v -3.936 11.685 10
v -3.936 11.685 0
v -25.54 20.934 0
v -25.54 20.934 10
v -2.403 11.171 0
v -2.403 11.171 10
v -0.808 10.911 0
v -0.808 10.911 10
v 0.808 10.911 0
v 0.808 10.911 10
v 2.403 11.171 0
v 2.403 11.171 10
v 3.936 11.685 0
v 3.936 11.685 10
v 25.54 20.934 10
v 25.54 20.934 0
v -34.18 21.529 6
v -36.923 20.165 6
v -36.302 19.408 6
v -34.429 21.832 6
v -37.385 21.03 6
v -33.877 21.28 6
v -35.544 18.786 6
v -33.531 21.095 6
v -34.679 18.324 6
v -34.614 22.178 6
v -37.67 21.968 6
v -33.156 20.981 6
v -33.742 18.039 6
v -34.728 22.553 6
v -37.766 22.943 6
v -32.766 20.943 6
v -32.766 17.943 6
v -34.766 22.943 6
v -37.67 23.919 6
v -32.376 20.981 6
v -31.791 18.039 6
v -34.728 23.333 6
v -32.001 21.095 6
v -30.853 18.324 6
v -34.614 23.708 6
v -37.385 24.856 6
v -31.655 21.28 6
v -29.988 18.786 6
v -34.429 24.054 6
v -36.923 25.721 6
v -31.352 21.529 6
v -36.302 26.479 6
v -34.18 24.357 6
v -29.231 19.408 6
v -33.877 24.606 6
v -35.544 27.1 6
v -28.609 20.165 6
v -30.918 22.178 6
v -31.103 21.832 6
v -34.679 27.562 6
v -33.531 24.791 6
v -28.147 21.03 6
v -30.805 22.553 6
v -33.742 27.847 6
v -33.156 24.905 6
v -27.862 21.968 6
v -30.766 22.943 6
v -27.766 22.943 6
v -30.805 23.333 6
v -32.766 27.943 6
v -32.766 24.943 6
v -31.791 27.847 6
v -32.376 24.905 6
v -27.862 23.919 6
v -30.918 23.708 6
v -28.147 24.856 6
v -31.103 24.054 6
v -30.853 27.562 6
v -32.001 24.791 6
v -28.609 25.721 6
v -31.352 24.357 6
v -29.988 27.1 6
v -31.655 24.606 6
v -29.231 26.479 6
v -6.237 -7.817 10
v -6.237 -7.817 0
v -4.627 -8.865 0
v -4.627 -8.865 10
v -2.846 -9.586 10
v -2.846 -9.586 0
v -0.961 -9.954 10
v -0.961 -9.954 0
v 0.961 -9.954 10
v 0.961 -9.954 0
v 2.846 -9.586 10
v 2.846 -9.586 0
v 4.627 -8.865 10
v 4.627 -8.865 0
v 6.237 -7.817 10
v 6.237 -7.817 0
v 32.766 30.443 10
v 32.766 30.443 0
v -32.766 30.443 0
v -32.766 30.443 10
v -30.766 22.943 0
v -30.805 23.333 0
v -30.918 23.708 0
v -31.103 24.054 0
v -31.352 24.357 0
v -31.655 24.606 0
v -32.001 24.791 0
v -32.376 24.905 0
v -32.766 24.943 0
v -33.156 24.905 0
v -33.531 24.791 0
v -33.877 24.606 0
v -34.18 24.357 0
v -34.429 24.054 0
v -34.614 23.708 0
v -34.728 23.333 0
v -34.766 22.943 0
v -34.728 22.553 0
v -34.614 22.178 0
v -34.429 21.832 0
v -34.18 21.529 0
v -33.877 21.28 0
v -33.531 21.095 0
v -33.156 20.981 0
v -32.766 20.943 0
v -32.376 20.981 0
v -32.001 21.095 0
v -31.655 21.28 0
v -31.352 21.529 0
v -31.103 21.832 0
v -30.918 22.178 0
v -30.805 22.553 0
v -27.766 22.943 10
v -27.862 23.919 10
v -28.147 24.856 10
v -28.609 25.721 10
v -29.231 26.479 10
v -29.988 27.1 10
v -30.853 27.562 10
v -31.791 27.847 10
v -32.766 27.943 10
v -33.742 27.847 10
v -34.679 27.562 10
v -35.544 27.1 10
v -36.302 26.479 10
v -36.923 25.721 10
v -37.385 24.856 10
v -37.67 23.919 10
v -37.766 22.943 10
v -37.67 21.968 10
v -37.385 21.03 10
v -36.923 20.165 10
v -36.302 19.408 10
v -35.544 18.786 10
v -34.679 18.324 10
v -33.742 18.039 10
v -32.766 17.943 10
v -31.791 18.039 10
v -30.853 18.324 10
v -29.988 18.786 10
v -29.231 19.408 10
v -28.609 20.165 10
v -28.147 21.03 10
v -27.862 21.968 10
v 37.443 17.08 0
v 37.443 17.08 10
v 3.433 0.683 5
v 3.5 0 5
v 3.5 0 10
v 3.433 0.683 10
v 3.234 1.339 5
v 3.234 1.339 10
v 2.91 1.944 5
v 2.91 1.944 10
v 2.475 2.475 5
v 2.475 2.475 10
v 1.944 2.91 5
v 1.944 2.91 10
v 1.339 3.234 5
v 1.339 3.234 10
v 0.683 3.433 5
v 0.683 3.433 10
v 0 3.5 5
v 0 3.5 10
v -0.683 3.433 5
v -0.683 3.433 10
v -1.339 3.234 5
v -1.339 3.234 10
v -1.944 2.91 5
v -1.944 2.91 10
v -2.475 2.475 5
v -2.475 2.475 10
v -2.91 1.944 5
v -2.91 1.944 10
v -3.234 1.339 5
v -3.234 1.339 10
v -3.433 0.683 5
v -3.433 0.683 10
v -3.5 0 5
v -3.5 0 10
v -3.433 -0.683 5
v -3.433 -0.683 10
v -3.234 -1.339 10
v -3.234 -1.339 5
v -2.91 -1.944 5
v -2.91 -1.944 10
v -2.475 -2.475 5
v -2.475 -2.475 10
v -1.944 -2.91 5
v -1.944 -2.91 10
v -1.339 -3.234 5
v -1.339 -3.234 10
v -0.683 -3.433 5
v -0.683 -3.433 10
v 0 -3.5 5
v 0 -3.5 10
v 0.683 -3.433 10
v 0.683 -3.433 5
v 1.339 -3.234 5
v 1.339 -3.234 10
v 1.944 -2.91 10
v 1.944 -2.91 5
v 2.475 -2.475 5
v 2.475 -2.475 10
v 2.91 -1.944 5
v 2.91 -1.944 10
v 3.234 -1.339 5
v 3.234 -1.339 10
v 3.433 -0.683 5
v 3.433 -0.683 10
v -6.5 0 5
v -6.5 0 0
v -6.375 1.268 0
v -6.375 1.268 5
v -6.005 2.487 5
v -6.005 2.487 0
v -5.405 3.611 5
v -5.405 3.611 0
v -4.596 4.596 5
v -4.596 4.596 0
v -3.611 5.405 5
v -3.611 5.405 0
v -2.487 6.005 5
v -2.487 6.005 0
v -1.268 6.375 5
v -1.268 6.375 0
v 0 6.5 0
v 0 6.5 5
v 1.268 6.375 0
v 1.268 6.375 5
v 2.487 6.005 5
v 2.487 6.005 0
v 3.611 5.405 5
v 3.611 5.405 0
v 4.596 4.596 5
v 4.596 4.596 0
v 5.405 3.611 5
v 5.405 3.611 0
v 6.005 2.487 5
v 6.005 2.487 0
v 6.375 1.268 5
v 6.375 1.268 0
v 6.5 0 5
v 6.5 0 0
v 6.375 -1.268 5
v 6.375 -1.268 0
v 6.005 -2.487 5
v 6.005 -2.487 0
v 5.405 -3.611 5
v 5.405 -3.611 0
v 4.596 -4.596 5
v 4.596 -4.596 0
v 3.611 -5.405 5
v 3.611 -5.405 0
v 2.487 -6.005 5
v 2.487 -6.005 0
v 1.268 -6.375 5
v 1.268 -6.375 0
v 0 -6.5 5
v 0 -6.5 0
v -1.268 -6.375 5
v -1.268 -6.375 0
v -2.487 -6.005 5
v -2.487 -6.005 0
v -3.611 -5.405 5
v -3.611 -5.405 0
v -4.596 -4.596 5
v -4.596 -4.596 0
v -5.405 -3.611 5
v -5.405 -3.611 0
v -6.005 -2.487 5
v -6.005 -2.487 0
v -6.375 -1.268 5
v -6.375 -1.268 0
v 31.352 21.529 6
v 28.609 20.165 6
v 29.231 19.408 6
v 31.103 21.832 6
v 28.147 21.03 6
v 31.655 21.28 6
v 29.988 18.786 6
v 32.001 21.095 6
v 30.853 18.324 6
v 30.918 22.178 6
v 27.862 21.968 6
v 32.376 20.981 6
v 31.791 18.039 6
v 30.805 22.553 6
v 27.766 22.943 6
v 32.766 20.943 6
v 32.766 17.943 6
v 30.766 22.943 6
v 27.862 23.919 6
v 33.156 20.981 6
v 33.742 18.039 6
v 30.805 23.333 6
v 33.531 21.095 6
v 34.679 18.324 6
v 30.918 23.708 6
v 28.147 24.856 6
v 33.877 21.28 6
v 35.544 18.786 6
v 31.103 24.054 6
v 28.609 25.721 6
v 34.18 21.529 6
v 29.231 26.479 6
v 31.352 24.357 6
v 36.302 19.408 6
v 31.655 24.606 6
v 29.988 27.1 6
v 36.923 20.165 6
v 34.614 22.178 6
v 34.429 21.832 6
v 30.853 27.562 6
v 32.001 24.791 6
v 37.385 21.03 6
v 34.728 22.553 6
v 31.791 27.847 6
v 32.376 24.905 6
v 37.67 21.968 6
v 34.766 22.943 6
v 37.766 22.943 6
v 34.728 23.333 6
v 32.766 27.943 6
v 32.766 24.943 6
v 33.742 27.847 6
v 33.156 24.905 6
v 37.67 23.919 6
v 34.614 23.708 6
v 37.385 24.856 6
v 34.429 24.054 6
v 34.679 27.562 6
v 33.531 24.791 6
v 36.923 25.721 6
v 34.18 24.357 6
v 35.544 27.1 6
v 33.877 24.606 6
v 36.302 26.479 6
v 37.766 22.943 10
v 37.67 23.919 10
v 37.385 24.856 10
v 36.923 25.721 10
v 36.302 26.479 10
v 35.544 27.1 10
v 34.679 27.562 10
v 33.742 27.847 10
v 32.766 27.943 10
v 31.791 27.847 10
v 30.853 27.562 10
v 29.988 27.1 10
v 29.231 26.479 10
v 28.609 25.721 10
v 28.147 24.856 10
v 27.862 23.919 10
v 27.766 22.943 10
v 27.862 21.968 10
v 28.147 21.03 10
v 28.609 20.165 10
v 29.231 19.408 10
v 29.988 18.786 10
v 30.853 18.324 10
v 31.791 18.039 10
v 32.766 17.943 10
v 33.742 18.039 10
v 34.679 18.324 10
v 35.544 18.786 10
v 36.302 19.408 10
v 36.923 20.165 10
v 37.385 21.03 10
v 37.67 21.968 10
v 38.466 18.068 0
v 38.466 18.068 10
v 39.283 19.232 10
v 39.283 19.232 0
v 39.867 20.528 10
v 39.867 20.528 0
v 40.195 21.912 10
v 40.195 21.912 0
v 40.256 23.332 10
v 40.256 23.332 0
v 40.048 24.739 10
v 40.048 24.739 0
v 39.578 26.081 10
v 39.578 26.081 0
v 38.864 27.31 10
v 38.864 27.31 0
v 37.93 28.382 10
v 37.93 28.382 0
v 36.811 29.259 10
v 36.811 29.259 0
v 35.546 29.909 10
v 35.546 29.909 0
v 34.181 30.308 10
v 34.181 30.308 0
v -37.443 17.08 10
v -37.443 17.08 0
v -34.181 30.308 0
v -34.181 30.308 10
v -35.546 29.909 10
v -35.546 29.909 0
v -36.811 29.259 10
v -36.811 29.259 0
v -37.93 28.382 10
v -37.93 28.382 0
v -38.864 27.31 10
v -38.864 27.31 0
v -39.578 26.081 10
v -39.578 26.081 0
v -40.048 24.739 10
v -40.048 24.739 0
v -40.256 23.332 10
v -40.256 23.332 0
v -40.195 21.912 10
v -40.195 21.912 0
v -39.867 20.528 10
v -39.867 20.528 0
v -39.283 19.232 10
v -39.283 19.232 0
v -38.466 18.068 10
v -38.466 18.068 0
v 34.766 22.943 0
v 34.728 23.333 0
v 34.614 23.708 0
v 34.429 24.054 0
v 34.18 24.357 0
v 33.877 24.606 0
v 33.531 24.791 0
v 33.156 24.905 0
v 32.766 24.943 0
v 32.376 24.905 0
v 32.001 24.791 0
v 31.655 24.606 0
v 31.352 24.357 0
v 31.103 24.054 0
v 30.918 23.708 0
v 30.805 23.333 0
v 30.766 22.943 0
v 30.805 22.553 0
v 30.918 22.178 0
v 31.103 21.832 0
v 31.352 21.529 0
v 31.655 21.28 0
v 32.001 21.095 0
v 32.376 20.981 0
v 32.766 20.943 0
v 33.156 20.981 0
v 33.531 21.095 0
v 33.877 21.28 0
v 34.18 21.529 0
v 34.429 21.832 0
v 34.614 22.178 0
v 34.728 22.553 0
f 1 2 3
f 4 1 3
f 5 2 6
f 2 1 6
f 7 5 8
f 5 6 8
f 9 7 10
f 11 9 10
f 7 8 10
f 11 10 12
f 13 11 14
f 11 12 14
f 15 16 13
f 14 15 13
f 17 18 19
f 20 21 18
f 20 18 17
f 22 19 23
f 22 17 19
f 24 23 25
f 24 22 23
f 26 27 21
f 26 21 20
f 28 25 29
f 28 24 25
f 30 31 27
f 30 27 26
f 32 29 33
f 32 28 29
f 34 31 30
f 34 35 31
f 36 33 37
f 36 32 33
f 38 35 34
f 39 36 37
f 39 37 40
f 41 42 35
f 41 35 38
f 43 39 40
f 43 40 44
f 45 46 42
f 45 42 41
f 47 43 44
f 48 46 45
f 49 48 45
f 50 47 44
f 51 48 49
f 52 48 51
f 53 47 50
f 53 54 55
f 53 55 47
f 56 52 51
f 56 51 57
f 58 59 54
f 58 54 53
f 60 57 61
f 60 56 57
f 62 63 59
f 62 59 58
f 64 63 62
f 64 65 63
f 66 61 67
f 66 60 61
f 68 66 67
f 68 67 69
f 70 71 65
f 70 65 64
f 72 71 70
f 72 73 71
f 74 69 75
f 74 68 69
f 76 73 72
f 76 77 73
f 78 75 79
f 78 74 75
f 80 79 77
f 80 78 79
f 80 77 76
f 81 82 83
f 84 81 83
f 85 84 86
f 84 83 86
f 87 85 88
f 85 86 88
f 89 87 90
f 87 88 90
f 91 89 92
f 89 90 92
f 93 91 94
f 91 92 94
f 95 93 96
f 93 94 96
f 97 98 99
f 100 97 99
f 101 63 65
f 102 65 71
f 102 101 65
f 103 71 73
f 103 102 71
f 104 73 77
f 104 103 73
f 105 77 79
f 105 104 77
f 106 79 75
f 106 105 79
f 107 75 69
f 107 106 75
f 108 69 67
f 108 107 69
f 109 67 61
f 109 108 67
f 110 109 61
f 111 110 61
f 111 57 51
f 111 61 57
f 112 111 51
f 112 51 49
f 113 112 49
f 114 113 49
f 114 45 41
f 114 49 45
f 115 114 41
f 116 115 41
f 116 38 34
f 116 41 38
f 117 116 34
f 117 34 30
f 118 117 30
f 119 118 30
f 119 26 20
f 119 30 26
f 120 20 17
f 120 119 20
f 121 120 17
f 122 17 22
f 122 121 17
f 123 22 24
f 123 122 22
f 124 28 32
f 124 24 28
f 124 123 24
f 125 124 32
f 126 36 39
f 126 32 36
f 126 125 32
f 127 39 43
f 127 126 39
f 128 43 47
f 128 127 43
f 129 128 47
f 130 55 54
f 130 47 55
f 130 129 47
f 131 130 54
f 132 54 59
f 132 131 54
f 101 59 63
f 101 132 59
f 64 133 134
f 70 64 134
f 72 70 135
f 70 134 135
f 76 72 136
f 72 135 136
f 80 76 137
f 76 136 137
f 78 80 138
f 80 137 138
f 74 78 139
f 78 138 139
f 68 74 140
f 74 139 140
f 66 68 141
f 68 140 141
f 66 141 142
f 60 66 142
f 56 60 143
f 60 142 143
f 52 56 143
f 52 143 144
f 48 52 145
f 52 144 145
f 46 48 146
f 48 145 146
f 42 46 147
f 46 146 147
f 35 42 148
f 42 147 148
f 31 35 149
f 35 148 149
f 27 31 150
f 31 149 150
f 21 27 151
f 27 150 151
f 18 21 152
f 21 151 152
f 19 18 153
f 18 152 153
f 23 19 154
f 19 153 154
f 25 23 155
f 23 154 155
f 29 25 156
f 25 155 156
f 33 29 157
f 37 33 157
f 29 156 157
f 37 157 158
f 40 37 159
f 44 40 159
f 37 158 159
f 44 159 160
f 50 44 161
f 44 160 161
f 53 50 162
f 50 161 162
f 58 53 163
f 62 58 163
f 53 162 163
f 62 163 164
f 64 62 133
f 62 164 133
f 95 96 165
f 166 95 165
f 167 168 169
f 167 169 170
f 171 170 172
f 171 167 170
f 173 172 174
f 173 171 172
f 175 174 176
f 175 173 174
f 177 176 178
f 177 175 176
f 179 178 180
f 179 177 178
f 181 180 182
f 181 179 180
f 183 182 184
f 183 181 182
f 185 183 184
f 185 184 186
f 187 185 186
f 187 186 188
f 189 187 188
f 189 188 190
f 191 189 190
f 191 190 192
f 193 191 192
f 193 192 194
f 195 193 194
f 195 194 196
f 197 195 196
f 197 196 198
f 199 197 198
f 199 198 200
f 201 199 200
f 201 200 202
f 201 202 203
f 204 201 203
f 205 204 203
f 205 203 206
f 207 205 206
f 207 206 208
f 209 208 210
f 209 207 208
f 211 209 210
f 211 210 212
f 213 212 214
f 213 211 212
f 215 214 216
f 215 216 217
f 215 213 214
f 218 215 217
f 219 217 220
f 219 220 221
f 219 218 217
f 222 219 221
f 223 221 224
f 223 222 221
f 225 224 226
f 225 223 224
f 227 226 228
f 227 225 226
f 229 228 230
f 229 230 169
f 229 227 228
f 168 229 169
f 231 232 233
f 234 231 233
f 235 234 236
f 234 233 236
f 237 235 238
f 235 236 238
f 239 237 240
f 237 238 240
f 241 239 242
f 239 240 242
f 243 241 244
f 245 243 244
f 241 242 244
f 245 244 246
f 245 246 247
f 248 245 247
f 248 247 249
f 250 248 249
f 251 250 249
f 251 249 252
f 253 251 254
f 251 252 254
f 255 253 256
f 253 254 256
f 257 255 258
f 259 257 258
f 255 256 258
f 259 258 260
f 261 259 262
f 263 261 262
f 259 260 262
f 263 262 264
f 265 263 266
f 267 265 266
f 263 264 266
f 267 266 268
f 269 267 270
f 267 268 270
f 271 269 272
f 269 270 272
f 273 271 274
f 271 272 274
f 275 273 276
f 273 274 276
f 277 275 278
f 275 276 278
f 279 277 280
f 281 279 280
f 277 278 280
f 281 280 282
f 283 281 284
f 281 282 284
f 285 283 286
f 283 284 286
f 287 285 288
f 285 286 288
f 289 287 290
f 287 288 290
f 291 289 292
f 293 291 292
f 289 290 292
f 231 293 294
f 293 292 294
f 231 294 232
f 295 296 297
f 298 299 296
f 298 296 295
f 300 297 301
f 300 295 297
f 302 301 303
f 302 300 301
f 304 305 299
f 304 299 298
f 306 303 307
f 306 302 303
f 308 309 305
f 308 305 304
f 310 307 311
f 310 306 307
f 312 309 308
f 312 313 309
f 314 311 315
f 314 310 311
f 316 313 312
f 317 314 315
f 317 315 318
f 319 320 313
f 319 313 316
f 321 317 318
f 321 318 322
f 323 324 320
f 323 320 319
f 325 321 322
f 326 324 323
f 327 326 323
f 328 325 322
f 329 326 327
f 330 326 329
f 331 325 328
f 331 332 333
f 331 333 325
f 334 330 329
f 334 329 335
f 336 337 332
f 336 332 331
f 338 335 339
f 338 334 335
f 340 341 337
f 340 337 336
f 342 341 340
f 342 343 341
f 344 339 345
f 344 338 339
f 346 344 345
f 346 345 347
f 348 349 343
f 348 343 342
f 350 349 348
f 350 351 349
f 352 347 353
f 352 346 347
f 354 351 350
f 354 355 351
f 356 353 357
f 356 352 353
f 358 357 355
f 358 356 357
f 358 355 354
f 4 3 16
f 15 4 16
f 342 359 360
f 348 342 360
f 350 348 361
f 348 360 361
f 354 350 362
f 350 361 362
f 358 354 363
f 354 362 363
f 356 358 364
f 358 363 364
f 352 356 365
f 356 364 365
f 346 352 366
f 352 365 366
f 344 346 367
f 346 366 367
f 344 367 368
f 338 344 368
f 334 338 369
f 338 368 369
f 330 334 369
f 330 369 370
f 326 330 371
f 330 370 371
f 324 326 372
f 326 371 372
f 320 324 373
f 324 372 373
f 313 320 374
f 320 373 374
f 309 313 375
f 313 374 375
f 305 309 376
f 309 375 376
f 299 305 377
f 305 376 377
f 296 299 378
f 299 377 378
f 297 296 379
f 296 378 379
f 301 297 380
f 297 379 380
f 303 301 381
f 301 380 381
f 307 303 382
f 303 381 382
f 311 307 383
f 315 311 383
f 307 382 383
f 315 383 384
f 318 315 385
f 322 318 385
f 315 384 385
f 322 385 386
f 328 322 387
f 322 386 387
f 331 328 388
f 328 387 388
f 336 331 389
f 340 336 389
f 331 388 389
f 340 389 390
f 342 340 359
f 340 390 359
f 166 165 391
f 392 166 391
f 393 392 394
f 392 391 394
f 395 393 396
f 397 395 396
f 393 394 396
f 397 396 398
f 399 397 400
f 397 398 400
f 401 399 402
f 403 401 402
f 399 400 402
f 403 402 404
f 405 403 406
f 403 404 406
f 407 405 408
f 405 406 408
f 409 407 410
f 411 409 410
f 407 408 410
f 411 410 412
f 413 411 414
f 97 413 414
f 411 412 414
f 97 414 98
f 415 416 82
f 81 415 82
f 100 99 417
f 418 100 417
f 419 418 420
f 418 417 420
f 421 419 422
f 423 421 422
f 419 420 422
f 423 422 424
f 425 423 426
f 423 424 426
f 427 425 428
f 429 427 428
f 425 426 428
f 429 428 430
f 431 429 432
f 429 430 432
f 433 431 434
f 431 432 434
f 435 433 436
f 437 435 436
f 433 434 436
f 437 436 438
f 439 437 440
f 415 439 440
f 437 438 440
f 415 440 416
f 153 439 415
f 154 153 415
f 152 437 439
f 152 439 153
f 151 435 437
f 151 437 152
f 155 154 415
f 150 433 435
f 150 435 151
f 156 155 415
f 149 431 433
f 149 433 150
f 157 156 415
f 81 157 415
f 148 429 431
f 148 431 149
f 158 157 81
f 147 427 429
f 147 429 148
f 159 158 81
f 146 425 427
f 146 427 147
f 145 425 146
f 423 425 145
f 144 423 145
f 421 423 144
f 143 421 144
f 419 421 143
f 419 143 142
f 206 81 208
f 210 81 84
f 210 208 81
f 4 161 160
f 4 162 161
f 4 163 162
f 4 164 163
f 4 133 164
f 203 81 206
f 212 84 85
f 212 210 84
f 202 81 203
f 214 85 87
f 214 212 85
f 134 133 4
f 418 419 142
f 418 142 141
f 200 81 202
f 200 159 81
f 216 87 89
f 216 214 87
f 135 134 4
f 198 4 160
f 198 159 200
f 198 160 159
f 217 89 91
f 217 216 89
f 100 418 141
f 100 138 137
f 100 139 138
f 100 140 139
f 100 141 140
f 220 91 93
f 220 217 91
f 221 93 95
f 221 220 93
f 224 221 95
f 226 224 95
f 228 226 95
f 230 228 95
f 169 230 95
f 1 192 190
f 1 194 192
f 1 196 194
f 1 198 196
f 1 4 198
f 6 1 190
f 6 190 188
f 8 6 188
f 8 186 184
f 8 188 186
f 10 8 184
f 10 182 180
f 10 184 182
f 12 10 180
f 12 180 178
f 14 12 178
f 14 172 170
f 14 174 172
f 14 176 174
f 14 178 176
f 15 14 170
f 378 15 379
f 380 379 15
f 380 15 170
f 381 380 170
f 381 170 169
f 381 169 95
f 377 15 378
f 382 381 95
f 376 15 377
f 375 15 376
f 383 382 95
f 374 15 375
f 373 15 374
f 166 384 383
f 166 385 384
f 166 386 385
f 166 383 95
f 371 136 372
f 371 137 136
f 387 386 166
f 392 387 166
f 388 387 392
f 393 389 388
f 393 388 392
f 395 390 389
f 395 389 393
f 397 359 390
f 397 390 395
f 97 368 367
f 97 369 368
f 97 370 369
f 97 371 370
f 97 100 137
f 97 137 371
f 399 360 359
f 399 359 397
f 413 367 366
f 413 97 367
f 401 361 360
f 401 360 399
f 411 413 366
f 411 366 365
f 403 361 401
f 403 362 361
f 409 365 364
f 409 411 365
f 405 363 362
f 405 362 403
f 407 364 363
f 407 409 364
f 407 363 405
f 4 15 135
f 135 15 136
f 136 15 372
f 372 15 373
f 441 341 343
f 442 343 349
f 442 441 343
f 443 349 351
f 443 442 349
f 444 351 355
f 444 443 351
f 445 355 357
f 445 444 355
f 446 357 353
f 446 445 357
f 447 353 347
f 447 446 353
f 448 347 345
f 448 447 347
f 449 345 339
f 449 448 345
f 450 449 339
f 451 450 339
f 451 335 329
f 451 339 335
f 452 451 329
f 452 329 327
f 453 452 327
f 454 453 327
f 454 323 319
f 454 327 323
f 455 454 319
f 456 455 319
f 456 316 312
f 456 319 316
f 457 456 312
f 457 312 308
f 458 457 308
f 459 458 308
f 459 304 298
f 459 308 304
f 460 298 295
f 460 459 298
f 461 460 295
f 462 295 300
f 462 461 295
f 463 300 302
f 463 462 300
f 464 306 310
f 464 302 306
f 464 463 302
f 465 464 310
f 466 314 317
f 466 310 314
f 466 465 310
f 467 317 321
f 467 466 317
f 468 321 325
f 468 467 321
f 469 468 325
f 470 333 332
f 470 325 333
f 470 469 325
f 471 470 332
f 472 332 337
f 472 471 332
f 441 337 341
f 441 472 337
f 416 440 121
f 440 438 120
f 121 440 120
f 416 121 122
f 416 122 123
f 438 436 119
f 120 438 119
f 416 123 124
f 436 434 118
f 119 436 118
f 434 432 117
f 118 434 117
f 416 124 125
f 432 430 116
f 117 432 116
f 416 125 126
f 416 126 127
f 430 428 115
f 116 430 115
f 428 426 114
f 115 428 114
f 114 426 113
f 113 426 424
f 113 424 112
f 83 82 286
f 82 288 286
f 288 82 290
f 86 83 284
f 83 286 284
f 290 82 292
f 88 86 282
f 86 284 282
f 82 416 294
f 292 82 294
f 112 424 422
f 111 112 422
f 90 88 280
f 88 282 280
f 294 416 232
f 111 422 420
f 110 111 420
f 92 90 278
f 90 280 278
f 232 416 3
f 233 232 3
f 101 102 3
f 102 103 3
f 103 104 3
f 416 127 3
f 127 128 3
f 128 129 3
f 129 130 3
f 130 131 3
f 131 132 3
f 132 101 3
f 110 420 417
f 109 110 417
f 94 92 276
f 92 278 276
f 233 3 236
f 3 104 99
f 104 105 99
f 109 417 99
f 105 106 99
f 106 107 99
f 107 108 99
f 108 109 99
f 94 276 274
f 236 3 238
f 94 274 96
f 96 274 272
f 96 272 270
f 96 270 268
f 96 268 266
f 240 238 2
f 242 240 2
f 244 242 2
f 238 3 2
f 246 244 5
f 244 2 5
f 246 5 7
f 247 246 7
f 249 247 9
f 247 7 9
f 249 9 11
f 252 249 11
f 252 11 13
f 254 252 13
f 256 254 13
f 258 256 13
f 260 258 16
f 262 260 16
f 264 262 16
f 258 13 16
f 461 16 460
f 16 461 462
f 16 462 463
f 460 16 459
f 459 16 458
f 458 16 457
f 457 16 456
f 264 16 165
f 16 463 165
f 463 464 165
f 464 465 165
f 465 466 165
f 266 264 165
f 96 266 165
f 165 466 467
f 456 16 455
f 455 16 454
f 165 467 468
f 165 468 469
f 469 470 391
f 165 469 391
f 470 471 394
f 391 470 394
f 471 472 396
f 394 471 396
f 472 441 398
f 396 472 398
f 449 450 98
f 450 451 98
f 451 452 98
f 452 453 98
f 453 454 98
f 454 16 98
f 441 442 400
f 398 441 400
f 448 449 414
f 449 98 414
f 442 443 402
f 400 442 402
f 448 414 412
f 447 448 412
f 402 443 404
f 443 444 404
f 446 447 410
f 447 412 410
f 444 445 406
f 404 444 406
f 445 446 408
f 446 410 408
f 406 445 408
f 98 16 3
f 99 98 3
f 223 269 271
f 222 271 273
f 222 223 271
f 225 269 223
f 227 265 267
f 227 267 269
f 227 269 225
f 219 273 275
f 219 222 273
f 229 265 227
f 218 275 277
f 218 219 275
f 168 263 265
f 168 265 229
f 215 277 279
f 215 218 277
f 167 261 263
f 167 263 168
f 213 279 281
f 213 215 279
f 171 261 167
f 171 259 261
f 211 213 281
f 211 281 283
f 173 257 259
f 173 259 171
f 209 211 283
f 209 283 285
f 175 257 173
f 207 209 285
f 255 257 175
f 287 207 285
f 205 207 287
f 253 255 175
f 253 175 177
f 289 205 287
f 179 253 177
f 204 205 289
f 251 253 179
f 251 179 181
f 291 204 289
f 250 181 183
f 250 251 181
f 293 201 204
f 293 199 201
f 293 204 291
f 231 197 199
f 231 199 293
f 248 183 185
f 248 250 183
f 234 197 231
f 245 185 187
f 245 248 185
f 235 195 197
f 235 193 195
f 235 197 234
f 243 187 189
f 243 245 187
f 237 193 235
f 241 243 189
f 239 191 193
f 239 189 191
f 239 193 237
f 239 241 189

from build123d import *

# Parameters (mm, degrees)
SKETCH1_R           = 3.5
SKETCH1_R_2         = 2
BOSS_EXTRUDE1_DEPTH = 10
FILLET1_R           = 10
SKETCH2_R           = 6.5
CUT_EXTRUDE1_DEPTH  = 5
SKETCH3_R           = 5
CUT_EXTRUDE2_DEPTH  = 4


with BuildPart() as part:
    # Sketch1 → Boss-Extrude1 (new body)
    with BuildSketch(Plane.XY):
        with BuildLine():
            Line((-37.443472345, 17.080292115), (-6.236520765, -7.817020452))
            ThreePointArc((-6.236520765, -7.817020452), (0, -10), (6.236520765, -7.817020452))
            Line((6.236520765, -7.817020452), (37.443472345, 17.080292115))
            ThreePointArc((37.443472345, 17.080292115), (39.84494962, 25.420885127), (32.766081772, 30.443057454))
            Line((32.766081772, 30.443057454), (-32.766081772, 30.443057454))
            ThreePointArc((-32.766081772, 30.443057454), (-39.84494962, 25.420885127), (-37.443472345, 17.080292115))
        make_face()
        Polygon((25.540228058, 20.933819261), (0, 10), (-25.540228058, 20.933819261), align=None, mode=Mode.SUBTRACT)
        Circle(SKETCH1_R, mode=Mode.SUBTRACT)
        with Locations((-32.766081772, 22.943057454)):
            Circle(SKETCH1_R_2, mode=Mode.SUBTRACT)
        with Locations((32.766081772, 22.943057454)):
            Circle(SKETCH1_R_2, mode=Mode.SUBTRACT)
    extrude(amount=BOSS_EXTRUDE1_DEPTH)

    # Fillet1
    fillet1_edges = [part.edges().sort_by_distance(p)[0] for p in [
        (0, 10, 5),
    ]]
    fillet(fillet1_edges, radius=FILLET1_R)

    # Sketch2 → Cut-Extrude1 (cut)
    with BuildSketch(Plane(origin=(0, 0, 0), x_dir=(-1, 0, 0), z_dir=(0, 0, -1))):
        Circle(SKETCH2_R)
    extrude(amount=-CUT_EXTRUDE1_DEPTH, mode=Mode.SUBTRACT)

    # Sketch3 → Cut-Extrude2 (cut)
    with BuildSketch(Plane.XY.offset(10)):
        with Locations((-32.766081772, 22.943057454)):
            Circle(SKETCH3_R)
        with Locations((32.766081772, 22.943057454)):
            Circle(SKETCH3_R)
    extrude(amount=-CUT_EXTRUDE2_DEPTH, mode=Mode.SUBTRACT)


solid = part.part
